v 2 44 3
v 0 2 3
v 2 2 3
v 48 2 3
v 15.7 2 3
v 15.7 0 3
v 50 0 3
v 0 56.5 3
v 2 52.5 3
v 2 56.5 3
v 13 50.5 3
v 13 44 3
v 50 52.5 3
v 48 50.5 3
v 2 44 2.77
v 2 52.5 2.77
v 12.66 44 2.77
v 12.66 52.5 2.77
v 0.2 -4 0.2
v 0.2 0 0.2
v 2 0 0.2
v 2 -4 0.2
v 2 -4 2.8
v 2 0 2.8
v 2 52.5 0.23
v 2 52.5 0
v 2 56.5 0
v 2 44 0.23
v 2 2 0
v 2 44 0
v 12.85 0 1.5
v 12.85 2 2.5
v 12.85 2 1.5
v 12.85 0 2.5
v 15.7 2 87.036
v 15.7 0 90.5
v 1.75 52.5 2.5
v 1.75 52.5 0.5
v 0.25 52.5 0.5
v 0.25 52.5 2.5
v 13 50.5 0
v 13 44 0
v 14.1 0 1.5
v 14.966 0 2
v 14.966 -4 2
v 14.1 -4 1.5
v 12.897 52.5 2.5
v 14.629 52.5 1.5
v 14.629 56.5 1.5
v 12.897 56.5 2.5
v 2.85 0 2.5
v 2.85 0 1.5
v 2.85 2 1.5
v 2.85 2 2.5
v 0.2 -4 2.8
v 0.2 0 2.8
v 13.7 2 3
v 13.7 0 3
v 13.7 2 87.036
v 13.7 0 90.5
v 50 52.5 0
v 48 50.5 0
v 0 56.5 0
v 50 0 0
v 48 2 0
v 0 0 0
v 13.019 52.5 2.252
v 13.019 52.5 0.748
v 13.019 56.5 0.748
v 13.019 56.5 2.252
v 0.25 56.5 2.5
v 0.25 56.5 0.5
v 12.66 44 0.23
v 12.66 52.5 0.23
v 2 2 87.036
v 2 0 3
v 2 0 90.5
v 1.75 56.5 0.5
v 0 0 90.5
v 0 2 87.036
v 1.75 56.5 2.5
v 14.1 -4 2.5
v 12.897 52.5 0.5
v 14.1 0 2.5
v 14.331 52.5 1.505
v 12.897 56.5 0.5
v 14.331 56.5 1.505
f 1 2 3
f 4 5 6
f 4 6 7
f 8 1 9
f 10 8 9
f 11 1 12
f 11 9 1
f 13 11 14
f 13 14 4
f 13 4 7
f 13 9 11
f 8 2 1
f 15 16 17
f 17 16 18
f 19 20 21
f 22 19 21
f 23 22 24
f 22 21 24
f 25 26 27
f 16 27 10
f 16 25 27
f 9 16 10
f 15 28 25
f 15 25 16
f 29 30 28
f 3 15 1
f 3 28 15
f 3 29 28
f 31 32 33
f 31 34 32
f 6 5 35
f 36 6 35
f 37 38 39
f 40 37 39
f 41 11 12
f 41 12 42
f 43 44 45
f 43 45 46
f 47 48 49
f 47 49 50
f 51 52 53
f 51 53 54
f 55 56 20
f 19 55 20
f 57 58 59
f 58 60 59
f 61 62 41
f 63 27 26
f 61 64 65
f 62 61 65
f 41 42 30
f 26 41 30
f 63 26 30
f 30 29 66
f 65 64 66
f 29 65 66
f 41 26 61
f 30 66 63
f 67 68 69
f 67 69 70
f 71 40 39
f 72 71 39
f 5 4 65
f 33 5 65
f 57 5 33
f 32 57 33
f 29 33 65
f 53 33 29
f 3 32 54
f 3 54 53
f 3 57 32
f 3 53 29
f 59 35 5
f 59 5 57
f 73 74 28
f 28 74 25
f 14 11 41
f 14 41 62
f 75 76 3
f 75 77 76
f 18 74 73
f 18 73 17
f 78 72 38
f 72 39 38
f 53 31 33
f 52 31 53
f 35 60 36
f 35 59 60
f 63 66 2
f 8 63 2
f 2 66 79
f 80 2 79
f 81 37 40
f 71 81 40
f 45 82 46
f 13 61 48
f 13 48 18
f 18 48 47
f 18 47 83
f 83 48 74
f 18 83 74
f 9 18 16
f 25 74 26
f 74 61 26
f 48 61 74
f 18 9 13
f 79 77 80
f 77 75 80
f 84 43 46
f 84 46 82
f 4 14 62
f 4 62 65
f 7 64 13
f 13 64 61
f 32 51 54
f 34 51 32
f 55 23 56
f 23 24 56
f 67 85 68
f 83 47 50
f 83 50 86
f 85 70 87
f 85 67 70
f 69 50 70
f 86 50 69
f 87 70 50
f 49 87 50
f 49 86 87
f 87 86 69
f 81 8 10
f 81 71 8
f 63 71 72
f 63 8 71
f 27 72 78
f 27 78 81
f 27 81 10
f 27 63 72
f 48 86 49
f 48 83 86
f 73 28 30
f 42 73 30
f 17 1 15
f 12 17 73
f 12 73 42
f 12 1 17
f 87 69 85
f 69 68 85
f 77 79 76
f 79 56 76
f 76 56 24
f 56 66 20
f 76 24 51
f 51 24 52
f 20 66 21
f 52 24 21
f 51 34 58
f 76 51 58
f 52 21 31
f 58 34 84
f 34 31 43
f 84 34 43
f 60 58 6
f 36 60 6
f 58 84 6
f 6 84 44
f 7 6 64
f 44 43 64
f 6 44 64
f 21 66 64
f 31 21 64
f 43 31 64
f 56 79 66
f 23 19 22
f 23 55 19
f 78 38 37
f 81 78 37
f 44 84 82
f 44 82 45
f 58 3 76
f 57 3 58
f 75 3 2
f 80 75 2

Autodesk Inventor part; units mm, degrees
ref_plane "YZ Plane" through (0, 0, 0) normal (1, 0, 0) x (0, 1, 0)
ref_plane "XZ Plane" through (0, 0, 0) normal (0, 1, 0) x (-1, 0, 0)
ref_plane "XY Plane" through (0, 0, 0) normal (0, 0, 1) x (1, 0, 0)
sketch "Sketch1" plane through (0, 0, 0) normal (0, 0, 1) x (1, 0, 0)
  line L0 (0, 0) -> (50, 0)
  line L1 (50, 0) -> (50, 52.5)
  line L2 (50, 52.5) -> (0, 52.5)
  line L3 (0, 52.5) -> (0, 0)
  dimension "d0" = 50
  dimension "d1" = 52.5
extrude "Extrusion1" add sketch "Sketch1" along normal blind 3
sketch "Sketch2" plane through (0, 0, 3) normal (0, 0, 1) x (1, 0, 0)
  line L0 (2, 50.5) -> (48, 50.5)
  line L1 (48, 50.5) -> (48, 2)
  line L2 (48, 2) -> (2, 2)
  line L3 (2, 2) -> (2, 50.5)
  dimension "d4" = 46
  dimension "d5" = 48.5
extrude "Extrusion2" cut sketch "Sketch2" against normal blind 10
sketch "Sketch3" plane through (0, 0, 3) normal (0, 0, 1) x (1, 0, 0)
  line L0 (48, 2) -> (2, 2) projected
  line L1 (0, 52.5) -> (0, 0) projected
  line L2 (2, 2) -> (0, 2)
  line L3 (0, 2) -> (0, 0)
  line L4 (0, 0) -> (2, 0)
  line L5 (2, 0) -> (2, 2)
  line L6 (0, 0) -> (50, 0) projected
  line L7 (13.7, 2) -> (15.7, 2)
  line L8 (15.7, 2) -> (15.7, 0)
  line L9 (15.7, 0) -> (13.7, 0)
  line L10 (13.7, 0) -> (13.7, 2)
  line L11 (0, 2) -> (2, 2)
  line L12 (2, 2) -> (2, 0)
  line L13 (2, 0) -> (0, 0)
  line L14 (0, 0) -> (0, 2)
  line L15 (13.7, 2) -> (15.7, 2)
  line L16 (15.7, 2) -> (15.7, 0)
  line L17 (15.7, 0) -> (13.7, 0)
  line L18 (13.7, 0) -> (13.7, 2)
  dimension "d8" = 2
  dimension "d9" = 11.7
extrude "Extrusion3" add sketch "Sketch3" along normal blind 87.5 contours L8 L6 L10 L0 | L5 L4 L1 L2
chamfer "Chamfer1" distance 2 angle 60 1 edges at (1, 2, 90.5) measured on face at (1.3333, 0.6667, 90.5)
chamfer "Chamfer2" distance 2 angle 60 1 edges at (14.7, 2, 90.5) measured on face at (14.3667, 0.6667, 90.5)
sketch "Sketch4" plane through (0, 0, 0) normal (0, -1, 0) x (1, 0, 0)
  line L0 (0, 0) -> (50, 0) projected
  line L1 (0, 0) -> (0, 90.5) projected
  line L2 (12.85, 1.5) -> (2.85, 1.5)
  line L3 (2.85, 1.5) -> (2.85, 2.5)
  line L4 (2.85, 2.5) -> (12.85, 2.5)
  line L5 (12.85, 2.5) -> (12.85, 1.5)
  dimension "d18" = 10
  dimension "d19" = 1
  dimension "d20" = 1.5
  dimension "d21" = 2.85
extrude "Extrusion4" cut sketch "Sketch4" against normal blind 10
sketch "Sketch5" plane through (0, 0, 0) normal (0, -1, 0) x (1, 0, 0)
  line L0 (12.85, 2.5) -> (12.85, 1.5) projected
  line L1 (2.85, 1.5) -> (2.85, 2.5) projected
  line L2 (0, 0) -> (50, 0) projected
  line L3 (14.1, 2.5) -> (14.966, 2)
  line L4 (14.966, 2) -> (14.1, 1.5)
  line L5 (14.1, 1.5) -> (14.1, 2.5)
  line L6 (2, 3) -> (48, 3) projected
  line L7 (2, 2.8) -> (0.2, 2.8)
  line L8 (0.2, 2.8) -> (0.2, 0.2)
  line L9 (0.2, 0.2) -> (2, 0.2)
  line L10 (2, 0.2) -> (2, 2.8)
  line L11 (2, 3) -> (13.7, 3) projected
  dimension "d24" = 1
  dimension "d25" = 1.8
  dimension "d26" = 0.85
  dimension "d27" = 1.25
  dimension "d28" = 1.8
  dimension "d29" = 2.6
  dimension "d30" = 2.6
  dimension "d31" = 1
  dimension "d32" = 1
  dimension "d33" = 0.5
  dimension "d103" = 0.2
  dimension "d104" = 0.2
extrude "Extrusion5" add sketch "Sketch5" along normal blind 4
sketch "Sketch6" plane through (0, 52.5, 0) normal (0, 1, 0) x (1, 0, 0)
  line L0 (0, 0) -> (0, -3) projected
  line L1 (50, -3) -> (0, -3) projected
  line L2 (12.66, -1.75) -> (12.66, -2.77)
  line L3 (12.66, -2.77) -> (2, -2.77)
  line L4 (2, -2.77) -> (2, -0.23)
  line L5 (2, -0.23) -> (12.66, -0.23)
  line L6 (12.66, -0.23) -> (12.66, -2.77)
  line L7 (50, 0) -> (0, 0) projected
  point P0 (2.85, -1.5)
  dimension "d1" = 52.5
  dimension "d51" = 10.66
  dimension "d52" = 2.54
  dimension "d54" = 0.23
  dimension "d55" = 2
  dimension "d57" = 0.23
extrude "Extrusion6" cut sketch "Sketch6" against normal blind 4
sketch "Sketch7" plane through (2, 50.5, 3) normal (0, -1, 0) x (1, 0, 0)
  line L0 (10.66, -2.77) -> (0, -2.77) projected
  line L1 (46, -3) -> (0, -3) projected
  line L2 (11, -3) -> (0, -3)
  line L3 (0, -3) -> (0, -2.77)
  line L4 (0, 0) -> (11, 0)
  line L5 (0, -0.23) -> (0, 0)
  line L6 (11, 0) -> (11, -3)
  line L7 (10.66, -2.77) -> (0, -2.77)
  line L8 (0, -0.23) -> (10.66, -0.23)
  line L9 (48, 0) -> (-2, 0) projected
  line L10 (10.66, -2.77) -> (10.66, -0.23)
  line L11 (11, -3) -> (11, 0)
  line L12 (10.66, -2.77) -> (10.66, -0.23) projected
  line L13 (10.66, -2.77) -> (10.66, -0.23)
  point P0 (-2, -3)
extrude "Extrusion7" add sketch "Sketch7" along normal blind 6.5
sketch "Sketch8" plane through (0, 52.5, 0) normal (0, 1, 0) x (1, 0, 0)
  line L0 (50, 0) -> (0, 0) projected
  line L1 (50, 0) -> (50, -3) projected
  line L2 (12.8966, -0.5) -> (14.6286, -1.5)
  line L3 (12.8966, -0.5) -> (14.8966, -0.5) construction
  line L4 (14.6286, -1.5) -> (12.8966, -2.5)
  line L5 (12.66, -2.77) -> (12.66, -0.23) projected
  line L6 (12.8966, -2.5) -> (12.8966, -0.5)
  line L7 (13.0189, -2.1236) -> (13.0189, -0.9087)
  line L8 (13.0189, -0.9087) -> (13.0189, -0.7479)
  line L9 (13.0189, -0.7479) -> (14.3309, -1.5054)
  line L10 (13.0189, -2.1236) -> (13.0189, -2.2521)
  line L11 (13.0189, -2.2521) -> (14.3309, -1.5054)
  dimension "d60" = 2
  dimension "d61" = 30
  dimension "d62" = 2
  dimension "d63" = 60
  dimension "d64" = 0.5
  dimension "d65" = 35.3714
  dimension "d98" = 1.312
  dimension "d99" = 0.1535
  dimension "d100" = 0.1535
sketch "Sketch9" plane through (0, 52.5, 0) normal (0, 1, 0) x (1, 0, 0)
  line L0 (50, 0) -> (0, 0) projected
  line L1 (0, 0) -> (0, -3) projected
  line L2 (50, -3) -> (0, -3) projected
  line L3 (2, -2.77) -> (2, -0.23) projected
  line L4 (2, -3) -> (0, -3)
  line L5 (0, -3) -> (0, 0)
  line L6 (0, 0) -> (2, 0)
  line L7 (2, 0) -> (2, -3)
  line L8 (1.75, -2.5) -> (0.25, -2.5)
  line L9 (0.25, -2.5) -> (0.25, -0.5)
  line L10 (0.25, -0.5) -> (1.75, -0.5)
  line L11 (1.75, -0.5) -> (1.75, -2.5)
  dimension "d74" = 2
  dimension "d75" = 3
  dimension "d76" = 0
  dimension "d77" = 0
  dimension "d78" = 0
  dimension "d79" = 0
  dimension "d81" = 1.5
  dimension "d82" = 2
  dimension "d94" = 0.5
  dimension "d95" = 0.25
extrude "Extrusion10" add sketch "Sketch9" along normal blind 4
extrude "Extrusion11" add sketch "Sketch8" along normal blind 4
properties part number "Zijplaat 1"
